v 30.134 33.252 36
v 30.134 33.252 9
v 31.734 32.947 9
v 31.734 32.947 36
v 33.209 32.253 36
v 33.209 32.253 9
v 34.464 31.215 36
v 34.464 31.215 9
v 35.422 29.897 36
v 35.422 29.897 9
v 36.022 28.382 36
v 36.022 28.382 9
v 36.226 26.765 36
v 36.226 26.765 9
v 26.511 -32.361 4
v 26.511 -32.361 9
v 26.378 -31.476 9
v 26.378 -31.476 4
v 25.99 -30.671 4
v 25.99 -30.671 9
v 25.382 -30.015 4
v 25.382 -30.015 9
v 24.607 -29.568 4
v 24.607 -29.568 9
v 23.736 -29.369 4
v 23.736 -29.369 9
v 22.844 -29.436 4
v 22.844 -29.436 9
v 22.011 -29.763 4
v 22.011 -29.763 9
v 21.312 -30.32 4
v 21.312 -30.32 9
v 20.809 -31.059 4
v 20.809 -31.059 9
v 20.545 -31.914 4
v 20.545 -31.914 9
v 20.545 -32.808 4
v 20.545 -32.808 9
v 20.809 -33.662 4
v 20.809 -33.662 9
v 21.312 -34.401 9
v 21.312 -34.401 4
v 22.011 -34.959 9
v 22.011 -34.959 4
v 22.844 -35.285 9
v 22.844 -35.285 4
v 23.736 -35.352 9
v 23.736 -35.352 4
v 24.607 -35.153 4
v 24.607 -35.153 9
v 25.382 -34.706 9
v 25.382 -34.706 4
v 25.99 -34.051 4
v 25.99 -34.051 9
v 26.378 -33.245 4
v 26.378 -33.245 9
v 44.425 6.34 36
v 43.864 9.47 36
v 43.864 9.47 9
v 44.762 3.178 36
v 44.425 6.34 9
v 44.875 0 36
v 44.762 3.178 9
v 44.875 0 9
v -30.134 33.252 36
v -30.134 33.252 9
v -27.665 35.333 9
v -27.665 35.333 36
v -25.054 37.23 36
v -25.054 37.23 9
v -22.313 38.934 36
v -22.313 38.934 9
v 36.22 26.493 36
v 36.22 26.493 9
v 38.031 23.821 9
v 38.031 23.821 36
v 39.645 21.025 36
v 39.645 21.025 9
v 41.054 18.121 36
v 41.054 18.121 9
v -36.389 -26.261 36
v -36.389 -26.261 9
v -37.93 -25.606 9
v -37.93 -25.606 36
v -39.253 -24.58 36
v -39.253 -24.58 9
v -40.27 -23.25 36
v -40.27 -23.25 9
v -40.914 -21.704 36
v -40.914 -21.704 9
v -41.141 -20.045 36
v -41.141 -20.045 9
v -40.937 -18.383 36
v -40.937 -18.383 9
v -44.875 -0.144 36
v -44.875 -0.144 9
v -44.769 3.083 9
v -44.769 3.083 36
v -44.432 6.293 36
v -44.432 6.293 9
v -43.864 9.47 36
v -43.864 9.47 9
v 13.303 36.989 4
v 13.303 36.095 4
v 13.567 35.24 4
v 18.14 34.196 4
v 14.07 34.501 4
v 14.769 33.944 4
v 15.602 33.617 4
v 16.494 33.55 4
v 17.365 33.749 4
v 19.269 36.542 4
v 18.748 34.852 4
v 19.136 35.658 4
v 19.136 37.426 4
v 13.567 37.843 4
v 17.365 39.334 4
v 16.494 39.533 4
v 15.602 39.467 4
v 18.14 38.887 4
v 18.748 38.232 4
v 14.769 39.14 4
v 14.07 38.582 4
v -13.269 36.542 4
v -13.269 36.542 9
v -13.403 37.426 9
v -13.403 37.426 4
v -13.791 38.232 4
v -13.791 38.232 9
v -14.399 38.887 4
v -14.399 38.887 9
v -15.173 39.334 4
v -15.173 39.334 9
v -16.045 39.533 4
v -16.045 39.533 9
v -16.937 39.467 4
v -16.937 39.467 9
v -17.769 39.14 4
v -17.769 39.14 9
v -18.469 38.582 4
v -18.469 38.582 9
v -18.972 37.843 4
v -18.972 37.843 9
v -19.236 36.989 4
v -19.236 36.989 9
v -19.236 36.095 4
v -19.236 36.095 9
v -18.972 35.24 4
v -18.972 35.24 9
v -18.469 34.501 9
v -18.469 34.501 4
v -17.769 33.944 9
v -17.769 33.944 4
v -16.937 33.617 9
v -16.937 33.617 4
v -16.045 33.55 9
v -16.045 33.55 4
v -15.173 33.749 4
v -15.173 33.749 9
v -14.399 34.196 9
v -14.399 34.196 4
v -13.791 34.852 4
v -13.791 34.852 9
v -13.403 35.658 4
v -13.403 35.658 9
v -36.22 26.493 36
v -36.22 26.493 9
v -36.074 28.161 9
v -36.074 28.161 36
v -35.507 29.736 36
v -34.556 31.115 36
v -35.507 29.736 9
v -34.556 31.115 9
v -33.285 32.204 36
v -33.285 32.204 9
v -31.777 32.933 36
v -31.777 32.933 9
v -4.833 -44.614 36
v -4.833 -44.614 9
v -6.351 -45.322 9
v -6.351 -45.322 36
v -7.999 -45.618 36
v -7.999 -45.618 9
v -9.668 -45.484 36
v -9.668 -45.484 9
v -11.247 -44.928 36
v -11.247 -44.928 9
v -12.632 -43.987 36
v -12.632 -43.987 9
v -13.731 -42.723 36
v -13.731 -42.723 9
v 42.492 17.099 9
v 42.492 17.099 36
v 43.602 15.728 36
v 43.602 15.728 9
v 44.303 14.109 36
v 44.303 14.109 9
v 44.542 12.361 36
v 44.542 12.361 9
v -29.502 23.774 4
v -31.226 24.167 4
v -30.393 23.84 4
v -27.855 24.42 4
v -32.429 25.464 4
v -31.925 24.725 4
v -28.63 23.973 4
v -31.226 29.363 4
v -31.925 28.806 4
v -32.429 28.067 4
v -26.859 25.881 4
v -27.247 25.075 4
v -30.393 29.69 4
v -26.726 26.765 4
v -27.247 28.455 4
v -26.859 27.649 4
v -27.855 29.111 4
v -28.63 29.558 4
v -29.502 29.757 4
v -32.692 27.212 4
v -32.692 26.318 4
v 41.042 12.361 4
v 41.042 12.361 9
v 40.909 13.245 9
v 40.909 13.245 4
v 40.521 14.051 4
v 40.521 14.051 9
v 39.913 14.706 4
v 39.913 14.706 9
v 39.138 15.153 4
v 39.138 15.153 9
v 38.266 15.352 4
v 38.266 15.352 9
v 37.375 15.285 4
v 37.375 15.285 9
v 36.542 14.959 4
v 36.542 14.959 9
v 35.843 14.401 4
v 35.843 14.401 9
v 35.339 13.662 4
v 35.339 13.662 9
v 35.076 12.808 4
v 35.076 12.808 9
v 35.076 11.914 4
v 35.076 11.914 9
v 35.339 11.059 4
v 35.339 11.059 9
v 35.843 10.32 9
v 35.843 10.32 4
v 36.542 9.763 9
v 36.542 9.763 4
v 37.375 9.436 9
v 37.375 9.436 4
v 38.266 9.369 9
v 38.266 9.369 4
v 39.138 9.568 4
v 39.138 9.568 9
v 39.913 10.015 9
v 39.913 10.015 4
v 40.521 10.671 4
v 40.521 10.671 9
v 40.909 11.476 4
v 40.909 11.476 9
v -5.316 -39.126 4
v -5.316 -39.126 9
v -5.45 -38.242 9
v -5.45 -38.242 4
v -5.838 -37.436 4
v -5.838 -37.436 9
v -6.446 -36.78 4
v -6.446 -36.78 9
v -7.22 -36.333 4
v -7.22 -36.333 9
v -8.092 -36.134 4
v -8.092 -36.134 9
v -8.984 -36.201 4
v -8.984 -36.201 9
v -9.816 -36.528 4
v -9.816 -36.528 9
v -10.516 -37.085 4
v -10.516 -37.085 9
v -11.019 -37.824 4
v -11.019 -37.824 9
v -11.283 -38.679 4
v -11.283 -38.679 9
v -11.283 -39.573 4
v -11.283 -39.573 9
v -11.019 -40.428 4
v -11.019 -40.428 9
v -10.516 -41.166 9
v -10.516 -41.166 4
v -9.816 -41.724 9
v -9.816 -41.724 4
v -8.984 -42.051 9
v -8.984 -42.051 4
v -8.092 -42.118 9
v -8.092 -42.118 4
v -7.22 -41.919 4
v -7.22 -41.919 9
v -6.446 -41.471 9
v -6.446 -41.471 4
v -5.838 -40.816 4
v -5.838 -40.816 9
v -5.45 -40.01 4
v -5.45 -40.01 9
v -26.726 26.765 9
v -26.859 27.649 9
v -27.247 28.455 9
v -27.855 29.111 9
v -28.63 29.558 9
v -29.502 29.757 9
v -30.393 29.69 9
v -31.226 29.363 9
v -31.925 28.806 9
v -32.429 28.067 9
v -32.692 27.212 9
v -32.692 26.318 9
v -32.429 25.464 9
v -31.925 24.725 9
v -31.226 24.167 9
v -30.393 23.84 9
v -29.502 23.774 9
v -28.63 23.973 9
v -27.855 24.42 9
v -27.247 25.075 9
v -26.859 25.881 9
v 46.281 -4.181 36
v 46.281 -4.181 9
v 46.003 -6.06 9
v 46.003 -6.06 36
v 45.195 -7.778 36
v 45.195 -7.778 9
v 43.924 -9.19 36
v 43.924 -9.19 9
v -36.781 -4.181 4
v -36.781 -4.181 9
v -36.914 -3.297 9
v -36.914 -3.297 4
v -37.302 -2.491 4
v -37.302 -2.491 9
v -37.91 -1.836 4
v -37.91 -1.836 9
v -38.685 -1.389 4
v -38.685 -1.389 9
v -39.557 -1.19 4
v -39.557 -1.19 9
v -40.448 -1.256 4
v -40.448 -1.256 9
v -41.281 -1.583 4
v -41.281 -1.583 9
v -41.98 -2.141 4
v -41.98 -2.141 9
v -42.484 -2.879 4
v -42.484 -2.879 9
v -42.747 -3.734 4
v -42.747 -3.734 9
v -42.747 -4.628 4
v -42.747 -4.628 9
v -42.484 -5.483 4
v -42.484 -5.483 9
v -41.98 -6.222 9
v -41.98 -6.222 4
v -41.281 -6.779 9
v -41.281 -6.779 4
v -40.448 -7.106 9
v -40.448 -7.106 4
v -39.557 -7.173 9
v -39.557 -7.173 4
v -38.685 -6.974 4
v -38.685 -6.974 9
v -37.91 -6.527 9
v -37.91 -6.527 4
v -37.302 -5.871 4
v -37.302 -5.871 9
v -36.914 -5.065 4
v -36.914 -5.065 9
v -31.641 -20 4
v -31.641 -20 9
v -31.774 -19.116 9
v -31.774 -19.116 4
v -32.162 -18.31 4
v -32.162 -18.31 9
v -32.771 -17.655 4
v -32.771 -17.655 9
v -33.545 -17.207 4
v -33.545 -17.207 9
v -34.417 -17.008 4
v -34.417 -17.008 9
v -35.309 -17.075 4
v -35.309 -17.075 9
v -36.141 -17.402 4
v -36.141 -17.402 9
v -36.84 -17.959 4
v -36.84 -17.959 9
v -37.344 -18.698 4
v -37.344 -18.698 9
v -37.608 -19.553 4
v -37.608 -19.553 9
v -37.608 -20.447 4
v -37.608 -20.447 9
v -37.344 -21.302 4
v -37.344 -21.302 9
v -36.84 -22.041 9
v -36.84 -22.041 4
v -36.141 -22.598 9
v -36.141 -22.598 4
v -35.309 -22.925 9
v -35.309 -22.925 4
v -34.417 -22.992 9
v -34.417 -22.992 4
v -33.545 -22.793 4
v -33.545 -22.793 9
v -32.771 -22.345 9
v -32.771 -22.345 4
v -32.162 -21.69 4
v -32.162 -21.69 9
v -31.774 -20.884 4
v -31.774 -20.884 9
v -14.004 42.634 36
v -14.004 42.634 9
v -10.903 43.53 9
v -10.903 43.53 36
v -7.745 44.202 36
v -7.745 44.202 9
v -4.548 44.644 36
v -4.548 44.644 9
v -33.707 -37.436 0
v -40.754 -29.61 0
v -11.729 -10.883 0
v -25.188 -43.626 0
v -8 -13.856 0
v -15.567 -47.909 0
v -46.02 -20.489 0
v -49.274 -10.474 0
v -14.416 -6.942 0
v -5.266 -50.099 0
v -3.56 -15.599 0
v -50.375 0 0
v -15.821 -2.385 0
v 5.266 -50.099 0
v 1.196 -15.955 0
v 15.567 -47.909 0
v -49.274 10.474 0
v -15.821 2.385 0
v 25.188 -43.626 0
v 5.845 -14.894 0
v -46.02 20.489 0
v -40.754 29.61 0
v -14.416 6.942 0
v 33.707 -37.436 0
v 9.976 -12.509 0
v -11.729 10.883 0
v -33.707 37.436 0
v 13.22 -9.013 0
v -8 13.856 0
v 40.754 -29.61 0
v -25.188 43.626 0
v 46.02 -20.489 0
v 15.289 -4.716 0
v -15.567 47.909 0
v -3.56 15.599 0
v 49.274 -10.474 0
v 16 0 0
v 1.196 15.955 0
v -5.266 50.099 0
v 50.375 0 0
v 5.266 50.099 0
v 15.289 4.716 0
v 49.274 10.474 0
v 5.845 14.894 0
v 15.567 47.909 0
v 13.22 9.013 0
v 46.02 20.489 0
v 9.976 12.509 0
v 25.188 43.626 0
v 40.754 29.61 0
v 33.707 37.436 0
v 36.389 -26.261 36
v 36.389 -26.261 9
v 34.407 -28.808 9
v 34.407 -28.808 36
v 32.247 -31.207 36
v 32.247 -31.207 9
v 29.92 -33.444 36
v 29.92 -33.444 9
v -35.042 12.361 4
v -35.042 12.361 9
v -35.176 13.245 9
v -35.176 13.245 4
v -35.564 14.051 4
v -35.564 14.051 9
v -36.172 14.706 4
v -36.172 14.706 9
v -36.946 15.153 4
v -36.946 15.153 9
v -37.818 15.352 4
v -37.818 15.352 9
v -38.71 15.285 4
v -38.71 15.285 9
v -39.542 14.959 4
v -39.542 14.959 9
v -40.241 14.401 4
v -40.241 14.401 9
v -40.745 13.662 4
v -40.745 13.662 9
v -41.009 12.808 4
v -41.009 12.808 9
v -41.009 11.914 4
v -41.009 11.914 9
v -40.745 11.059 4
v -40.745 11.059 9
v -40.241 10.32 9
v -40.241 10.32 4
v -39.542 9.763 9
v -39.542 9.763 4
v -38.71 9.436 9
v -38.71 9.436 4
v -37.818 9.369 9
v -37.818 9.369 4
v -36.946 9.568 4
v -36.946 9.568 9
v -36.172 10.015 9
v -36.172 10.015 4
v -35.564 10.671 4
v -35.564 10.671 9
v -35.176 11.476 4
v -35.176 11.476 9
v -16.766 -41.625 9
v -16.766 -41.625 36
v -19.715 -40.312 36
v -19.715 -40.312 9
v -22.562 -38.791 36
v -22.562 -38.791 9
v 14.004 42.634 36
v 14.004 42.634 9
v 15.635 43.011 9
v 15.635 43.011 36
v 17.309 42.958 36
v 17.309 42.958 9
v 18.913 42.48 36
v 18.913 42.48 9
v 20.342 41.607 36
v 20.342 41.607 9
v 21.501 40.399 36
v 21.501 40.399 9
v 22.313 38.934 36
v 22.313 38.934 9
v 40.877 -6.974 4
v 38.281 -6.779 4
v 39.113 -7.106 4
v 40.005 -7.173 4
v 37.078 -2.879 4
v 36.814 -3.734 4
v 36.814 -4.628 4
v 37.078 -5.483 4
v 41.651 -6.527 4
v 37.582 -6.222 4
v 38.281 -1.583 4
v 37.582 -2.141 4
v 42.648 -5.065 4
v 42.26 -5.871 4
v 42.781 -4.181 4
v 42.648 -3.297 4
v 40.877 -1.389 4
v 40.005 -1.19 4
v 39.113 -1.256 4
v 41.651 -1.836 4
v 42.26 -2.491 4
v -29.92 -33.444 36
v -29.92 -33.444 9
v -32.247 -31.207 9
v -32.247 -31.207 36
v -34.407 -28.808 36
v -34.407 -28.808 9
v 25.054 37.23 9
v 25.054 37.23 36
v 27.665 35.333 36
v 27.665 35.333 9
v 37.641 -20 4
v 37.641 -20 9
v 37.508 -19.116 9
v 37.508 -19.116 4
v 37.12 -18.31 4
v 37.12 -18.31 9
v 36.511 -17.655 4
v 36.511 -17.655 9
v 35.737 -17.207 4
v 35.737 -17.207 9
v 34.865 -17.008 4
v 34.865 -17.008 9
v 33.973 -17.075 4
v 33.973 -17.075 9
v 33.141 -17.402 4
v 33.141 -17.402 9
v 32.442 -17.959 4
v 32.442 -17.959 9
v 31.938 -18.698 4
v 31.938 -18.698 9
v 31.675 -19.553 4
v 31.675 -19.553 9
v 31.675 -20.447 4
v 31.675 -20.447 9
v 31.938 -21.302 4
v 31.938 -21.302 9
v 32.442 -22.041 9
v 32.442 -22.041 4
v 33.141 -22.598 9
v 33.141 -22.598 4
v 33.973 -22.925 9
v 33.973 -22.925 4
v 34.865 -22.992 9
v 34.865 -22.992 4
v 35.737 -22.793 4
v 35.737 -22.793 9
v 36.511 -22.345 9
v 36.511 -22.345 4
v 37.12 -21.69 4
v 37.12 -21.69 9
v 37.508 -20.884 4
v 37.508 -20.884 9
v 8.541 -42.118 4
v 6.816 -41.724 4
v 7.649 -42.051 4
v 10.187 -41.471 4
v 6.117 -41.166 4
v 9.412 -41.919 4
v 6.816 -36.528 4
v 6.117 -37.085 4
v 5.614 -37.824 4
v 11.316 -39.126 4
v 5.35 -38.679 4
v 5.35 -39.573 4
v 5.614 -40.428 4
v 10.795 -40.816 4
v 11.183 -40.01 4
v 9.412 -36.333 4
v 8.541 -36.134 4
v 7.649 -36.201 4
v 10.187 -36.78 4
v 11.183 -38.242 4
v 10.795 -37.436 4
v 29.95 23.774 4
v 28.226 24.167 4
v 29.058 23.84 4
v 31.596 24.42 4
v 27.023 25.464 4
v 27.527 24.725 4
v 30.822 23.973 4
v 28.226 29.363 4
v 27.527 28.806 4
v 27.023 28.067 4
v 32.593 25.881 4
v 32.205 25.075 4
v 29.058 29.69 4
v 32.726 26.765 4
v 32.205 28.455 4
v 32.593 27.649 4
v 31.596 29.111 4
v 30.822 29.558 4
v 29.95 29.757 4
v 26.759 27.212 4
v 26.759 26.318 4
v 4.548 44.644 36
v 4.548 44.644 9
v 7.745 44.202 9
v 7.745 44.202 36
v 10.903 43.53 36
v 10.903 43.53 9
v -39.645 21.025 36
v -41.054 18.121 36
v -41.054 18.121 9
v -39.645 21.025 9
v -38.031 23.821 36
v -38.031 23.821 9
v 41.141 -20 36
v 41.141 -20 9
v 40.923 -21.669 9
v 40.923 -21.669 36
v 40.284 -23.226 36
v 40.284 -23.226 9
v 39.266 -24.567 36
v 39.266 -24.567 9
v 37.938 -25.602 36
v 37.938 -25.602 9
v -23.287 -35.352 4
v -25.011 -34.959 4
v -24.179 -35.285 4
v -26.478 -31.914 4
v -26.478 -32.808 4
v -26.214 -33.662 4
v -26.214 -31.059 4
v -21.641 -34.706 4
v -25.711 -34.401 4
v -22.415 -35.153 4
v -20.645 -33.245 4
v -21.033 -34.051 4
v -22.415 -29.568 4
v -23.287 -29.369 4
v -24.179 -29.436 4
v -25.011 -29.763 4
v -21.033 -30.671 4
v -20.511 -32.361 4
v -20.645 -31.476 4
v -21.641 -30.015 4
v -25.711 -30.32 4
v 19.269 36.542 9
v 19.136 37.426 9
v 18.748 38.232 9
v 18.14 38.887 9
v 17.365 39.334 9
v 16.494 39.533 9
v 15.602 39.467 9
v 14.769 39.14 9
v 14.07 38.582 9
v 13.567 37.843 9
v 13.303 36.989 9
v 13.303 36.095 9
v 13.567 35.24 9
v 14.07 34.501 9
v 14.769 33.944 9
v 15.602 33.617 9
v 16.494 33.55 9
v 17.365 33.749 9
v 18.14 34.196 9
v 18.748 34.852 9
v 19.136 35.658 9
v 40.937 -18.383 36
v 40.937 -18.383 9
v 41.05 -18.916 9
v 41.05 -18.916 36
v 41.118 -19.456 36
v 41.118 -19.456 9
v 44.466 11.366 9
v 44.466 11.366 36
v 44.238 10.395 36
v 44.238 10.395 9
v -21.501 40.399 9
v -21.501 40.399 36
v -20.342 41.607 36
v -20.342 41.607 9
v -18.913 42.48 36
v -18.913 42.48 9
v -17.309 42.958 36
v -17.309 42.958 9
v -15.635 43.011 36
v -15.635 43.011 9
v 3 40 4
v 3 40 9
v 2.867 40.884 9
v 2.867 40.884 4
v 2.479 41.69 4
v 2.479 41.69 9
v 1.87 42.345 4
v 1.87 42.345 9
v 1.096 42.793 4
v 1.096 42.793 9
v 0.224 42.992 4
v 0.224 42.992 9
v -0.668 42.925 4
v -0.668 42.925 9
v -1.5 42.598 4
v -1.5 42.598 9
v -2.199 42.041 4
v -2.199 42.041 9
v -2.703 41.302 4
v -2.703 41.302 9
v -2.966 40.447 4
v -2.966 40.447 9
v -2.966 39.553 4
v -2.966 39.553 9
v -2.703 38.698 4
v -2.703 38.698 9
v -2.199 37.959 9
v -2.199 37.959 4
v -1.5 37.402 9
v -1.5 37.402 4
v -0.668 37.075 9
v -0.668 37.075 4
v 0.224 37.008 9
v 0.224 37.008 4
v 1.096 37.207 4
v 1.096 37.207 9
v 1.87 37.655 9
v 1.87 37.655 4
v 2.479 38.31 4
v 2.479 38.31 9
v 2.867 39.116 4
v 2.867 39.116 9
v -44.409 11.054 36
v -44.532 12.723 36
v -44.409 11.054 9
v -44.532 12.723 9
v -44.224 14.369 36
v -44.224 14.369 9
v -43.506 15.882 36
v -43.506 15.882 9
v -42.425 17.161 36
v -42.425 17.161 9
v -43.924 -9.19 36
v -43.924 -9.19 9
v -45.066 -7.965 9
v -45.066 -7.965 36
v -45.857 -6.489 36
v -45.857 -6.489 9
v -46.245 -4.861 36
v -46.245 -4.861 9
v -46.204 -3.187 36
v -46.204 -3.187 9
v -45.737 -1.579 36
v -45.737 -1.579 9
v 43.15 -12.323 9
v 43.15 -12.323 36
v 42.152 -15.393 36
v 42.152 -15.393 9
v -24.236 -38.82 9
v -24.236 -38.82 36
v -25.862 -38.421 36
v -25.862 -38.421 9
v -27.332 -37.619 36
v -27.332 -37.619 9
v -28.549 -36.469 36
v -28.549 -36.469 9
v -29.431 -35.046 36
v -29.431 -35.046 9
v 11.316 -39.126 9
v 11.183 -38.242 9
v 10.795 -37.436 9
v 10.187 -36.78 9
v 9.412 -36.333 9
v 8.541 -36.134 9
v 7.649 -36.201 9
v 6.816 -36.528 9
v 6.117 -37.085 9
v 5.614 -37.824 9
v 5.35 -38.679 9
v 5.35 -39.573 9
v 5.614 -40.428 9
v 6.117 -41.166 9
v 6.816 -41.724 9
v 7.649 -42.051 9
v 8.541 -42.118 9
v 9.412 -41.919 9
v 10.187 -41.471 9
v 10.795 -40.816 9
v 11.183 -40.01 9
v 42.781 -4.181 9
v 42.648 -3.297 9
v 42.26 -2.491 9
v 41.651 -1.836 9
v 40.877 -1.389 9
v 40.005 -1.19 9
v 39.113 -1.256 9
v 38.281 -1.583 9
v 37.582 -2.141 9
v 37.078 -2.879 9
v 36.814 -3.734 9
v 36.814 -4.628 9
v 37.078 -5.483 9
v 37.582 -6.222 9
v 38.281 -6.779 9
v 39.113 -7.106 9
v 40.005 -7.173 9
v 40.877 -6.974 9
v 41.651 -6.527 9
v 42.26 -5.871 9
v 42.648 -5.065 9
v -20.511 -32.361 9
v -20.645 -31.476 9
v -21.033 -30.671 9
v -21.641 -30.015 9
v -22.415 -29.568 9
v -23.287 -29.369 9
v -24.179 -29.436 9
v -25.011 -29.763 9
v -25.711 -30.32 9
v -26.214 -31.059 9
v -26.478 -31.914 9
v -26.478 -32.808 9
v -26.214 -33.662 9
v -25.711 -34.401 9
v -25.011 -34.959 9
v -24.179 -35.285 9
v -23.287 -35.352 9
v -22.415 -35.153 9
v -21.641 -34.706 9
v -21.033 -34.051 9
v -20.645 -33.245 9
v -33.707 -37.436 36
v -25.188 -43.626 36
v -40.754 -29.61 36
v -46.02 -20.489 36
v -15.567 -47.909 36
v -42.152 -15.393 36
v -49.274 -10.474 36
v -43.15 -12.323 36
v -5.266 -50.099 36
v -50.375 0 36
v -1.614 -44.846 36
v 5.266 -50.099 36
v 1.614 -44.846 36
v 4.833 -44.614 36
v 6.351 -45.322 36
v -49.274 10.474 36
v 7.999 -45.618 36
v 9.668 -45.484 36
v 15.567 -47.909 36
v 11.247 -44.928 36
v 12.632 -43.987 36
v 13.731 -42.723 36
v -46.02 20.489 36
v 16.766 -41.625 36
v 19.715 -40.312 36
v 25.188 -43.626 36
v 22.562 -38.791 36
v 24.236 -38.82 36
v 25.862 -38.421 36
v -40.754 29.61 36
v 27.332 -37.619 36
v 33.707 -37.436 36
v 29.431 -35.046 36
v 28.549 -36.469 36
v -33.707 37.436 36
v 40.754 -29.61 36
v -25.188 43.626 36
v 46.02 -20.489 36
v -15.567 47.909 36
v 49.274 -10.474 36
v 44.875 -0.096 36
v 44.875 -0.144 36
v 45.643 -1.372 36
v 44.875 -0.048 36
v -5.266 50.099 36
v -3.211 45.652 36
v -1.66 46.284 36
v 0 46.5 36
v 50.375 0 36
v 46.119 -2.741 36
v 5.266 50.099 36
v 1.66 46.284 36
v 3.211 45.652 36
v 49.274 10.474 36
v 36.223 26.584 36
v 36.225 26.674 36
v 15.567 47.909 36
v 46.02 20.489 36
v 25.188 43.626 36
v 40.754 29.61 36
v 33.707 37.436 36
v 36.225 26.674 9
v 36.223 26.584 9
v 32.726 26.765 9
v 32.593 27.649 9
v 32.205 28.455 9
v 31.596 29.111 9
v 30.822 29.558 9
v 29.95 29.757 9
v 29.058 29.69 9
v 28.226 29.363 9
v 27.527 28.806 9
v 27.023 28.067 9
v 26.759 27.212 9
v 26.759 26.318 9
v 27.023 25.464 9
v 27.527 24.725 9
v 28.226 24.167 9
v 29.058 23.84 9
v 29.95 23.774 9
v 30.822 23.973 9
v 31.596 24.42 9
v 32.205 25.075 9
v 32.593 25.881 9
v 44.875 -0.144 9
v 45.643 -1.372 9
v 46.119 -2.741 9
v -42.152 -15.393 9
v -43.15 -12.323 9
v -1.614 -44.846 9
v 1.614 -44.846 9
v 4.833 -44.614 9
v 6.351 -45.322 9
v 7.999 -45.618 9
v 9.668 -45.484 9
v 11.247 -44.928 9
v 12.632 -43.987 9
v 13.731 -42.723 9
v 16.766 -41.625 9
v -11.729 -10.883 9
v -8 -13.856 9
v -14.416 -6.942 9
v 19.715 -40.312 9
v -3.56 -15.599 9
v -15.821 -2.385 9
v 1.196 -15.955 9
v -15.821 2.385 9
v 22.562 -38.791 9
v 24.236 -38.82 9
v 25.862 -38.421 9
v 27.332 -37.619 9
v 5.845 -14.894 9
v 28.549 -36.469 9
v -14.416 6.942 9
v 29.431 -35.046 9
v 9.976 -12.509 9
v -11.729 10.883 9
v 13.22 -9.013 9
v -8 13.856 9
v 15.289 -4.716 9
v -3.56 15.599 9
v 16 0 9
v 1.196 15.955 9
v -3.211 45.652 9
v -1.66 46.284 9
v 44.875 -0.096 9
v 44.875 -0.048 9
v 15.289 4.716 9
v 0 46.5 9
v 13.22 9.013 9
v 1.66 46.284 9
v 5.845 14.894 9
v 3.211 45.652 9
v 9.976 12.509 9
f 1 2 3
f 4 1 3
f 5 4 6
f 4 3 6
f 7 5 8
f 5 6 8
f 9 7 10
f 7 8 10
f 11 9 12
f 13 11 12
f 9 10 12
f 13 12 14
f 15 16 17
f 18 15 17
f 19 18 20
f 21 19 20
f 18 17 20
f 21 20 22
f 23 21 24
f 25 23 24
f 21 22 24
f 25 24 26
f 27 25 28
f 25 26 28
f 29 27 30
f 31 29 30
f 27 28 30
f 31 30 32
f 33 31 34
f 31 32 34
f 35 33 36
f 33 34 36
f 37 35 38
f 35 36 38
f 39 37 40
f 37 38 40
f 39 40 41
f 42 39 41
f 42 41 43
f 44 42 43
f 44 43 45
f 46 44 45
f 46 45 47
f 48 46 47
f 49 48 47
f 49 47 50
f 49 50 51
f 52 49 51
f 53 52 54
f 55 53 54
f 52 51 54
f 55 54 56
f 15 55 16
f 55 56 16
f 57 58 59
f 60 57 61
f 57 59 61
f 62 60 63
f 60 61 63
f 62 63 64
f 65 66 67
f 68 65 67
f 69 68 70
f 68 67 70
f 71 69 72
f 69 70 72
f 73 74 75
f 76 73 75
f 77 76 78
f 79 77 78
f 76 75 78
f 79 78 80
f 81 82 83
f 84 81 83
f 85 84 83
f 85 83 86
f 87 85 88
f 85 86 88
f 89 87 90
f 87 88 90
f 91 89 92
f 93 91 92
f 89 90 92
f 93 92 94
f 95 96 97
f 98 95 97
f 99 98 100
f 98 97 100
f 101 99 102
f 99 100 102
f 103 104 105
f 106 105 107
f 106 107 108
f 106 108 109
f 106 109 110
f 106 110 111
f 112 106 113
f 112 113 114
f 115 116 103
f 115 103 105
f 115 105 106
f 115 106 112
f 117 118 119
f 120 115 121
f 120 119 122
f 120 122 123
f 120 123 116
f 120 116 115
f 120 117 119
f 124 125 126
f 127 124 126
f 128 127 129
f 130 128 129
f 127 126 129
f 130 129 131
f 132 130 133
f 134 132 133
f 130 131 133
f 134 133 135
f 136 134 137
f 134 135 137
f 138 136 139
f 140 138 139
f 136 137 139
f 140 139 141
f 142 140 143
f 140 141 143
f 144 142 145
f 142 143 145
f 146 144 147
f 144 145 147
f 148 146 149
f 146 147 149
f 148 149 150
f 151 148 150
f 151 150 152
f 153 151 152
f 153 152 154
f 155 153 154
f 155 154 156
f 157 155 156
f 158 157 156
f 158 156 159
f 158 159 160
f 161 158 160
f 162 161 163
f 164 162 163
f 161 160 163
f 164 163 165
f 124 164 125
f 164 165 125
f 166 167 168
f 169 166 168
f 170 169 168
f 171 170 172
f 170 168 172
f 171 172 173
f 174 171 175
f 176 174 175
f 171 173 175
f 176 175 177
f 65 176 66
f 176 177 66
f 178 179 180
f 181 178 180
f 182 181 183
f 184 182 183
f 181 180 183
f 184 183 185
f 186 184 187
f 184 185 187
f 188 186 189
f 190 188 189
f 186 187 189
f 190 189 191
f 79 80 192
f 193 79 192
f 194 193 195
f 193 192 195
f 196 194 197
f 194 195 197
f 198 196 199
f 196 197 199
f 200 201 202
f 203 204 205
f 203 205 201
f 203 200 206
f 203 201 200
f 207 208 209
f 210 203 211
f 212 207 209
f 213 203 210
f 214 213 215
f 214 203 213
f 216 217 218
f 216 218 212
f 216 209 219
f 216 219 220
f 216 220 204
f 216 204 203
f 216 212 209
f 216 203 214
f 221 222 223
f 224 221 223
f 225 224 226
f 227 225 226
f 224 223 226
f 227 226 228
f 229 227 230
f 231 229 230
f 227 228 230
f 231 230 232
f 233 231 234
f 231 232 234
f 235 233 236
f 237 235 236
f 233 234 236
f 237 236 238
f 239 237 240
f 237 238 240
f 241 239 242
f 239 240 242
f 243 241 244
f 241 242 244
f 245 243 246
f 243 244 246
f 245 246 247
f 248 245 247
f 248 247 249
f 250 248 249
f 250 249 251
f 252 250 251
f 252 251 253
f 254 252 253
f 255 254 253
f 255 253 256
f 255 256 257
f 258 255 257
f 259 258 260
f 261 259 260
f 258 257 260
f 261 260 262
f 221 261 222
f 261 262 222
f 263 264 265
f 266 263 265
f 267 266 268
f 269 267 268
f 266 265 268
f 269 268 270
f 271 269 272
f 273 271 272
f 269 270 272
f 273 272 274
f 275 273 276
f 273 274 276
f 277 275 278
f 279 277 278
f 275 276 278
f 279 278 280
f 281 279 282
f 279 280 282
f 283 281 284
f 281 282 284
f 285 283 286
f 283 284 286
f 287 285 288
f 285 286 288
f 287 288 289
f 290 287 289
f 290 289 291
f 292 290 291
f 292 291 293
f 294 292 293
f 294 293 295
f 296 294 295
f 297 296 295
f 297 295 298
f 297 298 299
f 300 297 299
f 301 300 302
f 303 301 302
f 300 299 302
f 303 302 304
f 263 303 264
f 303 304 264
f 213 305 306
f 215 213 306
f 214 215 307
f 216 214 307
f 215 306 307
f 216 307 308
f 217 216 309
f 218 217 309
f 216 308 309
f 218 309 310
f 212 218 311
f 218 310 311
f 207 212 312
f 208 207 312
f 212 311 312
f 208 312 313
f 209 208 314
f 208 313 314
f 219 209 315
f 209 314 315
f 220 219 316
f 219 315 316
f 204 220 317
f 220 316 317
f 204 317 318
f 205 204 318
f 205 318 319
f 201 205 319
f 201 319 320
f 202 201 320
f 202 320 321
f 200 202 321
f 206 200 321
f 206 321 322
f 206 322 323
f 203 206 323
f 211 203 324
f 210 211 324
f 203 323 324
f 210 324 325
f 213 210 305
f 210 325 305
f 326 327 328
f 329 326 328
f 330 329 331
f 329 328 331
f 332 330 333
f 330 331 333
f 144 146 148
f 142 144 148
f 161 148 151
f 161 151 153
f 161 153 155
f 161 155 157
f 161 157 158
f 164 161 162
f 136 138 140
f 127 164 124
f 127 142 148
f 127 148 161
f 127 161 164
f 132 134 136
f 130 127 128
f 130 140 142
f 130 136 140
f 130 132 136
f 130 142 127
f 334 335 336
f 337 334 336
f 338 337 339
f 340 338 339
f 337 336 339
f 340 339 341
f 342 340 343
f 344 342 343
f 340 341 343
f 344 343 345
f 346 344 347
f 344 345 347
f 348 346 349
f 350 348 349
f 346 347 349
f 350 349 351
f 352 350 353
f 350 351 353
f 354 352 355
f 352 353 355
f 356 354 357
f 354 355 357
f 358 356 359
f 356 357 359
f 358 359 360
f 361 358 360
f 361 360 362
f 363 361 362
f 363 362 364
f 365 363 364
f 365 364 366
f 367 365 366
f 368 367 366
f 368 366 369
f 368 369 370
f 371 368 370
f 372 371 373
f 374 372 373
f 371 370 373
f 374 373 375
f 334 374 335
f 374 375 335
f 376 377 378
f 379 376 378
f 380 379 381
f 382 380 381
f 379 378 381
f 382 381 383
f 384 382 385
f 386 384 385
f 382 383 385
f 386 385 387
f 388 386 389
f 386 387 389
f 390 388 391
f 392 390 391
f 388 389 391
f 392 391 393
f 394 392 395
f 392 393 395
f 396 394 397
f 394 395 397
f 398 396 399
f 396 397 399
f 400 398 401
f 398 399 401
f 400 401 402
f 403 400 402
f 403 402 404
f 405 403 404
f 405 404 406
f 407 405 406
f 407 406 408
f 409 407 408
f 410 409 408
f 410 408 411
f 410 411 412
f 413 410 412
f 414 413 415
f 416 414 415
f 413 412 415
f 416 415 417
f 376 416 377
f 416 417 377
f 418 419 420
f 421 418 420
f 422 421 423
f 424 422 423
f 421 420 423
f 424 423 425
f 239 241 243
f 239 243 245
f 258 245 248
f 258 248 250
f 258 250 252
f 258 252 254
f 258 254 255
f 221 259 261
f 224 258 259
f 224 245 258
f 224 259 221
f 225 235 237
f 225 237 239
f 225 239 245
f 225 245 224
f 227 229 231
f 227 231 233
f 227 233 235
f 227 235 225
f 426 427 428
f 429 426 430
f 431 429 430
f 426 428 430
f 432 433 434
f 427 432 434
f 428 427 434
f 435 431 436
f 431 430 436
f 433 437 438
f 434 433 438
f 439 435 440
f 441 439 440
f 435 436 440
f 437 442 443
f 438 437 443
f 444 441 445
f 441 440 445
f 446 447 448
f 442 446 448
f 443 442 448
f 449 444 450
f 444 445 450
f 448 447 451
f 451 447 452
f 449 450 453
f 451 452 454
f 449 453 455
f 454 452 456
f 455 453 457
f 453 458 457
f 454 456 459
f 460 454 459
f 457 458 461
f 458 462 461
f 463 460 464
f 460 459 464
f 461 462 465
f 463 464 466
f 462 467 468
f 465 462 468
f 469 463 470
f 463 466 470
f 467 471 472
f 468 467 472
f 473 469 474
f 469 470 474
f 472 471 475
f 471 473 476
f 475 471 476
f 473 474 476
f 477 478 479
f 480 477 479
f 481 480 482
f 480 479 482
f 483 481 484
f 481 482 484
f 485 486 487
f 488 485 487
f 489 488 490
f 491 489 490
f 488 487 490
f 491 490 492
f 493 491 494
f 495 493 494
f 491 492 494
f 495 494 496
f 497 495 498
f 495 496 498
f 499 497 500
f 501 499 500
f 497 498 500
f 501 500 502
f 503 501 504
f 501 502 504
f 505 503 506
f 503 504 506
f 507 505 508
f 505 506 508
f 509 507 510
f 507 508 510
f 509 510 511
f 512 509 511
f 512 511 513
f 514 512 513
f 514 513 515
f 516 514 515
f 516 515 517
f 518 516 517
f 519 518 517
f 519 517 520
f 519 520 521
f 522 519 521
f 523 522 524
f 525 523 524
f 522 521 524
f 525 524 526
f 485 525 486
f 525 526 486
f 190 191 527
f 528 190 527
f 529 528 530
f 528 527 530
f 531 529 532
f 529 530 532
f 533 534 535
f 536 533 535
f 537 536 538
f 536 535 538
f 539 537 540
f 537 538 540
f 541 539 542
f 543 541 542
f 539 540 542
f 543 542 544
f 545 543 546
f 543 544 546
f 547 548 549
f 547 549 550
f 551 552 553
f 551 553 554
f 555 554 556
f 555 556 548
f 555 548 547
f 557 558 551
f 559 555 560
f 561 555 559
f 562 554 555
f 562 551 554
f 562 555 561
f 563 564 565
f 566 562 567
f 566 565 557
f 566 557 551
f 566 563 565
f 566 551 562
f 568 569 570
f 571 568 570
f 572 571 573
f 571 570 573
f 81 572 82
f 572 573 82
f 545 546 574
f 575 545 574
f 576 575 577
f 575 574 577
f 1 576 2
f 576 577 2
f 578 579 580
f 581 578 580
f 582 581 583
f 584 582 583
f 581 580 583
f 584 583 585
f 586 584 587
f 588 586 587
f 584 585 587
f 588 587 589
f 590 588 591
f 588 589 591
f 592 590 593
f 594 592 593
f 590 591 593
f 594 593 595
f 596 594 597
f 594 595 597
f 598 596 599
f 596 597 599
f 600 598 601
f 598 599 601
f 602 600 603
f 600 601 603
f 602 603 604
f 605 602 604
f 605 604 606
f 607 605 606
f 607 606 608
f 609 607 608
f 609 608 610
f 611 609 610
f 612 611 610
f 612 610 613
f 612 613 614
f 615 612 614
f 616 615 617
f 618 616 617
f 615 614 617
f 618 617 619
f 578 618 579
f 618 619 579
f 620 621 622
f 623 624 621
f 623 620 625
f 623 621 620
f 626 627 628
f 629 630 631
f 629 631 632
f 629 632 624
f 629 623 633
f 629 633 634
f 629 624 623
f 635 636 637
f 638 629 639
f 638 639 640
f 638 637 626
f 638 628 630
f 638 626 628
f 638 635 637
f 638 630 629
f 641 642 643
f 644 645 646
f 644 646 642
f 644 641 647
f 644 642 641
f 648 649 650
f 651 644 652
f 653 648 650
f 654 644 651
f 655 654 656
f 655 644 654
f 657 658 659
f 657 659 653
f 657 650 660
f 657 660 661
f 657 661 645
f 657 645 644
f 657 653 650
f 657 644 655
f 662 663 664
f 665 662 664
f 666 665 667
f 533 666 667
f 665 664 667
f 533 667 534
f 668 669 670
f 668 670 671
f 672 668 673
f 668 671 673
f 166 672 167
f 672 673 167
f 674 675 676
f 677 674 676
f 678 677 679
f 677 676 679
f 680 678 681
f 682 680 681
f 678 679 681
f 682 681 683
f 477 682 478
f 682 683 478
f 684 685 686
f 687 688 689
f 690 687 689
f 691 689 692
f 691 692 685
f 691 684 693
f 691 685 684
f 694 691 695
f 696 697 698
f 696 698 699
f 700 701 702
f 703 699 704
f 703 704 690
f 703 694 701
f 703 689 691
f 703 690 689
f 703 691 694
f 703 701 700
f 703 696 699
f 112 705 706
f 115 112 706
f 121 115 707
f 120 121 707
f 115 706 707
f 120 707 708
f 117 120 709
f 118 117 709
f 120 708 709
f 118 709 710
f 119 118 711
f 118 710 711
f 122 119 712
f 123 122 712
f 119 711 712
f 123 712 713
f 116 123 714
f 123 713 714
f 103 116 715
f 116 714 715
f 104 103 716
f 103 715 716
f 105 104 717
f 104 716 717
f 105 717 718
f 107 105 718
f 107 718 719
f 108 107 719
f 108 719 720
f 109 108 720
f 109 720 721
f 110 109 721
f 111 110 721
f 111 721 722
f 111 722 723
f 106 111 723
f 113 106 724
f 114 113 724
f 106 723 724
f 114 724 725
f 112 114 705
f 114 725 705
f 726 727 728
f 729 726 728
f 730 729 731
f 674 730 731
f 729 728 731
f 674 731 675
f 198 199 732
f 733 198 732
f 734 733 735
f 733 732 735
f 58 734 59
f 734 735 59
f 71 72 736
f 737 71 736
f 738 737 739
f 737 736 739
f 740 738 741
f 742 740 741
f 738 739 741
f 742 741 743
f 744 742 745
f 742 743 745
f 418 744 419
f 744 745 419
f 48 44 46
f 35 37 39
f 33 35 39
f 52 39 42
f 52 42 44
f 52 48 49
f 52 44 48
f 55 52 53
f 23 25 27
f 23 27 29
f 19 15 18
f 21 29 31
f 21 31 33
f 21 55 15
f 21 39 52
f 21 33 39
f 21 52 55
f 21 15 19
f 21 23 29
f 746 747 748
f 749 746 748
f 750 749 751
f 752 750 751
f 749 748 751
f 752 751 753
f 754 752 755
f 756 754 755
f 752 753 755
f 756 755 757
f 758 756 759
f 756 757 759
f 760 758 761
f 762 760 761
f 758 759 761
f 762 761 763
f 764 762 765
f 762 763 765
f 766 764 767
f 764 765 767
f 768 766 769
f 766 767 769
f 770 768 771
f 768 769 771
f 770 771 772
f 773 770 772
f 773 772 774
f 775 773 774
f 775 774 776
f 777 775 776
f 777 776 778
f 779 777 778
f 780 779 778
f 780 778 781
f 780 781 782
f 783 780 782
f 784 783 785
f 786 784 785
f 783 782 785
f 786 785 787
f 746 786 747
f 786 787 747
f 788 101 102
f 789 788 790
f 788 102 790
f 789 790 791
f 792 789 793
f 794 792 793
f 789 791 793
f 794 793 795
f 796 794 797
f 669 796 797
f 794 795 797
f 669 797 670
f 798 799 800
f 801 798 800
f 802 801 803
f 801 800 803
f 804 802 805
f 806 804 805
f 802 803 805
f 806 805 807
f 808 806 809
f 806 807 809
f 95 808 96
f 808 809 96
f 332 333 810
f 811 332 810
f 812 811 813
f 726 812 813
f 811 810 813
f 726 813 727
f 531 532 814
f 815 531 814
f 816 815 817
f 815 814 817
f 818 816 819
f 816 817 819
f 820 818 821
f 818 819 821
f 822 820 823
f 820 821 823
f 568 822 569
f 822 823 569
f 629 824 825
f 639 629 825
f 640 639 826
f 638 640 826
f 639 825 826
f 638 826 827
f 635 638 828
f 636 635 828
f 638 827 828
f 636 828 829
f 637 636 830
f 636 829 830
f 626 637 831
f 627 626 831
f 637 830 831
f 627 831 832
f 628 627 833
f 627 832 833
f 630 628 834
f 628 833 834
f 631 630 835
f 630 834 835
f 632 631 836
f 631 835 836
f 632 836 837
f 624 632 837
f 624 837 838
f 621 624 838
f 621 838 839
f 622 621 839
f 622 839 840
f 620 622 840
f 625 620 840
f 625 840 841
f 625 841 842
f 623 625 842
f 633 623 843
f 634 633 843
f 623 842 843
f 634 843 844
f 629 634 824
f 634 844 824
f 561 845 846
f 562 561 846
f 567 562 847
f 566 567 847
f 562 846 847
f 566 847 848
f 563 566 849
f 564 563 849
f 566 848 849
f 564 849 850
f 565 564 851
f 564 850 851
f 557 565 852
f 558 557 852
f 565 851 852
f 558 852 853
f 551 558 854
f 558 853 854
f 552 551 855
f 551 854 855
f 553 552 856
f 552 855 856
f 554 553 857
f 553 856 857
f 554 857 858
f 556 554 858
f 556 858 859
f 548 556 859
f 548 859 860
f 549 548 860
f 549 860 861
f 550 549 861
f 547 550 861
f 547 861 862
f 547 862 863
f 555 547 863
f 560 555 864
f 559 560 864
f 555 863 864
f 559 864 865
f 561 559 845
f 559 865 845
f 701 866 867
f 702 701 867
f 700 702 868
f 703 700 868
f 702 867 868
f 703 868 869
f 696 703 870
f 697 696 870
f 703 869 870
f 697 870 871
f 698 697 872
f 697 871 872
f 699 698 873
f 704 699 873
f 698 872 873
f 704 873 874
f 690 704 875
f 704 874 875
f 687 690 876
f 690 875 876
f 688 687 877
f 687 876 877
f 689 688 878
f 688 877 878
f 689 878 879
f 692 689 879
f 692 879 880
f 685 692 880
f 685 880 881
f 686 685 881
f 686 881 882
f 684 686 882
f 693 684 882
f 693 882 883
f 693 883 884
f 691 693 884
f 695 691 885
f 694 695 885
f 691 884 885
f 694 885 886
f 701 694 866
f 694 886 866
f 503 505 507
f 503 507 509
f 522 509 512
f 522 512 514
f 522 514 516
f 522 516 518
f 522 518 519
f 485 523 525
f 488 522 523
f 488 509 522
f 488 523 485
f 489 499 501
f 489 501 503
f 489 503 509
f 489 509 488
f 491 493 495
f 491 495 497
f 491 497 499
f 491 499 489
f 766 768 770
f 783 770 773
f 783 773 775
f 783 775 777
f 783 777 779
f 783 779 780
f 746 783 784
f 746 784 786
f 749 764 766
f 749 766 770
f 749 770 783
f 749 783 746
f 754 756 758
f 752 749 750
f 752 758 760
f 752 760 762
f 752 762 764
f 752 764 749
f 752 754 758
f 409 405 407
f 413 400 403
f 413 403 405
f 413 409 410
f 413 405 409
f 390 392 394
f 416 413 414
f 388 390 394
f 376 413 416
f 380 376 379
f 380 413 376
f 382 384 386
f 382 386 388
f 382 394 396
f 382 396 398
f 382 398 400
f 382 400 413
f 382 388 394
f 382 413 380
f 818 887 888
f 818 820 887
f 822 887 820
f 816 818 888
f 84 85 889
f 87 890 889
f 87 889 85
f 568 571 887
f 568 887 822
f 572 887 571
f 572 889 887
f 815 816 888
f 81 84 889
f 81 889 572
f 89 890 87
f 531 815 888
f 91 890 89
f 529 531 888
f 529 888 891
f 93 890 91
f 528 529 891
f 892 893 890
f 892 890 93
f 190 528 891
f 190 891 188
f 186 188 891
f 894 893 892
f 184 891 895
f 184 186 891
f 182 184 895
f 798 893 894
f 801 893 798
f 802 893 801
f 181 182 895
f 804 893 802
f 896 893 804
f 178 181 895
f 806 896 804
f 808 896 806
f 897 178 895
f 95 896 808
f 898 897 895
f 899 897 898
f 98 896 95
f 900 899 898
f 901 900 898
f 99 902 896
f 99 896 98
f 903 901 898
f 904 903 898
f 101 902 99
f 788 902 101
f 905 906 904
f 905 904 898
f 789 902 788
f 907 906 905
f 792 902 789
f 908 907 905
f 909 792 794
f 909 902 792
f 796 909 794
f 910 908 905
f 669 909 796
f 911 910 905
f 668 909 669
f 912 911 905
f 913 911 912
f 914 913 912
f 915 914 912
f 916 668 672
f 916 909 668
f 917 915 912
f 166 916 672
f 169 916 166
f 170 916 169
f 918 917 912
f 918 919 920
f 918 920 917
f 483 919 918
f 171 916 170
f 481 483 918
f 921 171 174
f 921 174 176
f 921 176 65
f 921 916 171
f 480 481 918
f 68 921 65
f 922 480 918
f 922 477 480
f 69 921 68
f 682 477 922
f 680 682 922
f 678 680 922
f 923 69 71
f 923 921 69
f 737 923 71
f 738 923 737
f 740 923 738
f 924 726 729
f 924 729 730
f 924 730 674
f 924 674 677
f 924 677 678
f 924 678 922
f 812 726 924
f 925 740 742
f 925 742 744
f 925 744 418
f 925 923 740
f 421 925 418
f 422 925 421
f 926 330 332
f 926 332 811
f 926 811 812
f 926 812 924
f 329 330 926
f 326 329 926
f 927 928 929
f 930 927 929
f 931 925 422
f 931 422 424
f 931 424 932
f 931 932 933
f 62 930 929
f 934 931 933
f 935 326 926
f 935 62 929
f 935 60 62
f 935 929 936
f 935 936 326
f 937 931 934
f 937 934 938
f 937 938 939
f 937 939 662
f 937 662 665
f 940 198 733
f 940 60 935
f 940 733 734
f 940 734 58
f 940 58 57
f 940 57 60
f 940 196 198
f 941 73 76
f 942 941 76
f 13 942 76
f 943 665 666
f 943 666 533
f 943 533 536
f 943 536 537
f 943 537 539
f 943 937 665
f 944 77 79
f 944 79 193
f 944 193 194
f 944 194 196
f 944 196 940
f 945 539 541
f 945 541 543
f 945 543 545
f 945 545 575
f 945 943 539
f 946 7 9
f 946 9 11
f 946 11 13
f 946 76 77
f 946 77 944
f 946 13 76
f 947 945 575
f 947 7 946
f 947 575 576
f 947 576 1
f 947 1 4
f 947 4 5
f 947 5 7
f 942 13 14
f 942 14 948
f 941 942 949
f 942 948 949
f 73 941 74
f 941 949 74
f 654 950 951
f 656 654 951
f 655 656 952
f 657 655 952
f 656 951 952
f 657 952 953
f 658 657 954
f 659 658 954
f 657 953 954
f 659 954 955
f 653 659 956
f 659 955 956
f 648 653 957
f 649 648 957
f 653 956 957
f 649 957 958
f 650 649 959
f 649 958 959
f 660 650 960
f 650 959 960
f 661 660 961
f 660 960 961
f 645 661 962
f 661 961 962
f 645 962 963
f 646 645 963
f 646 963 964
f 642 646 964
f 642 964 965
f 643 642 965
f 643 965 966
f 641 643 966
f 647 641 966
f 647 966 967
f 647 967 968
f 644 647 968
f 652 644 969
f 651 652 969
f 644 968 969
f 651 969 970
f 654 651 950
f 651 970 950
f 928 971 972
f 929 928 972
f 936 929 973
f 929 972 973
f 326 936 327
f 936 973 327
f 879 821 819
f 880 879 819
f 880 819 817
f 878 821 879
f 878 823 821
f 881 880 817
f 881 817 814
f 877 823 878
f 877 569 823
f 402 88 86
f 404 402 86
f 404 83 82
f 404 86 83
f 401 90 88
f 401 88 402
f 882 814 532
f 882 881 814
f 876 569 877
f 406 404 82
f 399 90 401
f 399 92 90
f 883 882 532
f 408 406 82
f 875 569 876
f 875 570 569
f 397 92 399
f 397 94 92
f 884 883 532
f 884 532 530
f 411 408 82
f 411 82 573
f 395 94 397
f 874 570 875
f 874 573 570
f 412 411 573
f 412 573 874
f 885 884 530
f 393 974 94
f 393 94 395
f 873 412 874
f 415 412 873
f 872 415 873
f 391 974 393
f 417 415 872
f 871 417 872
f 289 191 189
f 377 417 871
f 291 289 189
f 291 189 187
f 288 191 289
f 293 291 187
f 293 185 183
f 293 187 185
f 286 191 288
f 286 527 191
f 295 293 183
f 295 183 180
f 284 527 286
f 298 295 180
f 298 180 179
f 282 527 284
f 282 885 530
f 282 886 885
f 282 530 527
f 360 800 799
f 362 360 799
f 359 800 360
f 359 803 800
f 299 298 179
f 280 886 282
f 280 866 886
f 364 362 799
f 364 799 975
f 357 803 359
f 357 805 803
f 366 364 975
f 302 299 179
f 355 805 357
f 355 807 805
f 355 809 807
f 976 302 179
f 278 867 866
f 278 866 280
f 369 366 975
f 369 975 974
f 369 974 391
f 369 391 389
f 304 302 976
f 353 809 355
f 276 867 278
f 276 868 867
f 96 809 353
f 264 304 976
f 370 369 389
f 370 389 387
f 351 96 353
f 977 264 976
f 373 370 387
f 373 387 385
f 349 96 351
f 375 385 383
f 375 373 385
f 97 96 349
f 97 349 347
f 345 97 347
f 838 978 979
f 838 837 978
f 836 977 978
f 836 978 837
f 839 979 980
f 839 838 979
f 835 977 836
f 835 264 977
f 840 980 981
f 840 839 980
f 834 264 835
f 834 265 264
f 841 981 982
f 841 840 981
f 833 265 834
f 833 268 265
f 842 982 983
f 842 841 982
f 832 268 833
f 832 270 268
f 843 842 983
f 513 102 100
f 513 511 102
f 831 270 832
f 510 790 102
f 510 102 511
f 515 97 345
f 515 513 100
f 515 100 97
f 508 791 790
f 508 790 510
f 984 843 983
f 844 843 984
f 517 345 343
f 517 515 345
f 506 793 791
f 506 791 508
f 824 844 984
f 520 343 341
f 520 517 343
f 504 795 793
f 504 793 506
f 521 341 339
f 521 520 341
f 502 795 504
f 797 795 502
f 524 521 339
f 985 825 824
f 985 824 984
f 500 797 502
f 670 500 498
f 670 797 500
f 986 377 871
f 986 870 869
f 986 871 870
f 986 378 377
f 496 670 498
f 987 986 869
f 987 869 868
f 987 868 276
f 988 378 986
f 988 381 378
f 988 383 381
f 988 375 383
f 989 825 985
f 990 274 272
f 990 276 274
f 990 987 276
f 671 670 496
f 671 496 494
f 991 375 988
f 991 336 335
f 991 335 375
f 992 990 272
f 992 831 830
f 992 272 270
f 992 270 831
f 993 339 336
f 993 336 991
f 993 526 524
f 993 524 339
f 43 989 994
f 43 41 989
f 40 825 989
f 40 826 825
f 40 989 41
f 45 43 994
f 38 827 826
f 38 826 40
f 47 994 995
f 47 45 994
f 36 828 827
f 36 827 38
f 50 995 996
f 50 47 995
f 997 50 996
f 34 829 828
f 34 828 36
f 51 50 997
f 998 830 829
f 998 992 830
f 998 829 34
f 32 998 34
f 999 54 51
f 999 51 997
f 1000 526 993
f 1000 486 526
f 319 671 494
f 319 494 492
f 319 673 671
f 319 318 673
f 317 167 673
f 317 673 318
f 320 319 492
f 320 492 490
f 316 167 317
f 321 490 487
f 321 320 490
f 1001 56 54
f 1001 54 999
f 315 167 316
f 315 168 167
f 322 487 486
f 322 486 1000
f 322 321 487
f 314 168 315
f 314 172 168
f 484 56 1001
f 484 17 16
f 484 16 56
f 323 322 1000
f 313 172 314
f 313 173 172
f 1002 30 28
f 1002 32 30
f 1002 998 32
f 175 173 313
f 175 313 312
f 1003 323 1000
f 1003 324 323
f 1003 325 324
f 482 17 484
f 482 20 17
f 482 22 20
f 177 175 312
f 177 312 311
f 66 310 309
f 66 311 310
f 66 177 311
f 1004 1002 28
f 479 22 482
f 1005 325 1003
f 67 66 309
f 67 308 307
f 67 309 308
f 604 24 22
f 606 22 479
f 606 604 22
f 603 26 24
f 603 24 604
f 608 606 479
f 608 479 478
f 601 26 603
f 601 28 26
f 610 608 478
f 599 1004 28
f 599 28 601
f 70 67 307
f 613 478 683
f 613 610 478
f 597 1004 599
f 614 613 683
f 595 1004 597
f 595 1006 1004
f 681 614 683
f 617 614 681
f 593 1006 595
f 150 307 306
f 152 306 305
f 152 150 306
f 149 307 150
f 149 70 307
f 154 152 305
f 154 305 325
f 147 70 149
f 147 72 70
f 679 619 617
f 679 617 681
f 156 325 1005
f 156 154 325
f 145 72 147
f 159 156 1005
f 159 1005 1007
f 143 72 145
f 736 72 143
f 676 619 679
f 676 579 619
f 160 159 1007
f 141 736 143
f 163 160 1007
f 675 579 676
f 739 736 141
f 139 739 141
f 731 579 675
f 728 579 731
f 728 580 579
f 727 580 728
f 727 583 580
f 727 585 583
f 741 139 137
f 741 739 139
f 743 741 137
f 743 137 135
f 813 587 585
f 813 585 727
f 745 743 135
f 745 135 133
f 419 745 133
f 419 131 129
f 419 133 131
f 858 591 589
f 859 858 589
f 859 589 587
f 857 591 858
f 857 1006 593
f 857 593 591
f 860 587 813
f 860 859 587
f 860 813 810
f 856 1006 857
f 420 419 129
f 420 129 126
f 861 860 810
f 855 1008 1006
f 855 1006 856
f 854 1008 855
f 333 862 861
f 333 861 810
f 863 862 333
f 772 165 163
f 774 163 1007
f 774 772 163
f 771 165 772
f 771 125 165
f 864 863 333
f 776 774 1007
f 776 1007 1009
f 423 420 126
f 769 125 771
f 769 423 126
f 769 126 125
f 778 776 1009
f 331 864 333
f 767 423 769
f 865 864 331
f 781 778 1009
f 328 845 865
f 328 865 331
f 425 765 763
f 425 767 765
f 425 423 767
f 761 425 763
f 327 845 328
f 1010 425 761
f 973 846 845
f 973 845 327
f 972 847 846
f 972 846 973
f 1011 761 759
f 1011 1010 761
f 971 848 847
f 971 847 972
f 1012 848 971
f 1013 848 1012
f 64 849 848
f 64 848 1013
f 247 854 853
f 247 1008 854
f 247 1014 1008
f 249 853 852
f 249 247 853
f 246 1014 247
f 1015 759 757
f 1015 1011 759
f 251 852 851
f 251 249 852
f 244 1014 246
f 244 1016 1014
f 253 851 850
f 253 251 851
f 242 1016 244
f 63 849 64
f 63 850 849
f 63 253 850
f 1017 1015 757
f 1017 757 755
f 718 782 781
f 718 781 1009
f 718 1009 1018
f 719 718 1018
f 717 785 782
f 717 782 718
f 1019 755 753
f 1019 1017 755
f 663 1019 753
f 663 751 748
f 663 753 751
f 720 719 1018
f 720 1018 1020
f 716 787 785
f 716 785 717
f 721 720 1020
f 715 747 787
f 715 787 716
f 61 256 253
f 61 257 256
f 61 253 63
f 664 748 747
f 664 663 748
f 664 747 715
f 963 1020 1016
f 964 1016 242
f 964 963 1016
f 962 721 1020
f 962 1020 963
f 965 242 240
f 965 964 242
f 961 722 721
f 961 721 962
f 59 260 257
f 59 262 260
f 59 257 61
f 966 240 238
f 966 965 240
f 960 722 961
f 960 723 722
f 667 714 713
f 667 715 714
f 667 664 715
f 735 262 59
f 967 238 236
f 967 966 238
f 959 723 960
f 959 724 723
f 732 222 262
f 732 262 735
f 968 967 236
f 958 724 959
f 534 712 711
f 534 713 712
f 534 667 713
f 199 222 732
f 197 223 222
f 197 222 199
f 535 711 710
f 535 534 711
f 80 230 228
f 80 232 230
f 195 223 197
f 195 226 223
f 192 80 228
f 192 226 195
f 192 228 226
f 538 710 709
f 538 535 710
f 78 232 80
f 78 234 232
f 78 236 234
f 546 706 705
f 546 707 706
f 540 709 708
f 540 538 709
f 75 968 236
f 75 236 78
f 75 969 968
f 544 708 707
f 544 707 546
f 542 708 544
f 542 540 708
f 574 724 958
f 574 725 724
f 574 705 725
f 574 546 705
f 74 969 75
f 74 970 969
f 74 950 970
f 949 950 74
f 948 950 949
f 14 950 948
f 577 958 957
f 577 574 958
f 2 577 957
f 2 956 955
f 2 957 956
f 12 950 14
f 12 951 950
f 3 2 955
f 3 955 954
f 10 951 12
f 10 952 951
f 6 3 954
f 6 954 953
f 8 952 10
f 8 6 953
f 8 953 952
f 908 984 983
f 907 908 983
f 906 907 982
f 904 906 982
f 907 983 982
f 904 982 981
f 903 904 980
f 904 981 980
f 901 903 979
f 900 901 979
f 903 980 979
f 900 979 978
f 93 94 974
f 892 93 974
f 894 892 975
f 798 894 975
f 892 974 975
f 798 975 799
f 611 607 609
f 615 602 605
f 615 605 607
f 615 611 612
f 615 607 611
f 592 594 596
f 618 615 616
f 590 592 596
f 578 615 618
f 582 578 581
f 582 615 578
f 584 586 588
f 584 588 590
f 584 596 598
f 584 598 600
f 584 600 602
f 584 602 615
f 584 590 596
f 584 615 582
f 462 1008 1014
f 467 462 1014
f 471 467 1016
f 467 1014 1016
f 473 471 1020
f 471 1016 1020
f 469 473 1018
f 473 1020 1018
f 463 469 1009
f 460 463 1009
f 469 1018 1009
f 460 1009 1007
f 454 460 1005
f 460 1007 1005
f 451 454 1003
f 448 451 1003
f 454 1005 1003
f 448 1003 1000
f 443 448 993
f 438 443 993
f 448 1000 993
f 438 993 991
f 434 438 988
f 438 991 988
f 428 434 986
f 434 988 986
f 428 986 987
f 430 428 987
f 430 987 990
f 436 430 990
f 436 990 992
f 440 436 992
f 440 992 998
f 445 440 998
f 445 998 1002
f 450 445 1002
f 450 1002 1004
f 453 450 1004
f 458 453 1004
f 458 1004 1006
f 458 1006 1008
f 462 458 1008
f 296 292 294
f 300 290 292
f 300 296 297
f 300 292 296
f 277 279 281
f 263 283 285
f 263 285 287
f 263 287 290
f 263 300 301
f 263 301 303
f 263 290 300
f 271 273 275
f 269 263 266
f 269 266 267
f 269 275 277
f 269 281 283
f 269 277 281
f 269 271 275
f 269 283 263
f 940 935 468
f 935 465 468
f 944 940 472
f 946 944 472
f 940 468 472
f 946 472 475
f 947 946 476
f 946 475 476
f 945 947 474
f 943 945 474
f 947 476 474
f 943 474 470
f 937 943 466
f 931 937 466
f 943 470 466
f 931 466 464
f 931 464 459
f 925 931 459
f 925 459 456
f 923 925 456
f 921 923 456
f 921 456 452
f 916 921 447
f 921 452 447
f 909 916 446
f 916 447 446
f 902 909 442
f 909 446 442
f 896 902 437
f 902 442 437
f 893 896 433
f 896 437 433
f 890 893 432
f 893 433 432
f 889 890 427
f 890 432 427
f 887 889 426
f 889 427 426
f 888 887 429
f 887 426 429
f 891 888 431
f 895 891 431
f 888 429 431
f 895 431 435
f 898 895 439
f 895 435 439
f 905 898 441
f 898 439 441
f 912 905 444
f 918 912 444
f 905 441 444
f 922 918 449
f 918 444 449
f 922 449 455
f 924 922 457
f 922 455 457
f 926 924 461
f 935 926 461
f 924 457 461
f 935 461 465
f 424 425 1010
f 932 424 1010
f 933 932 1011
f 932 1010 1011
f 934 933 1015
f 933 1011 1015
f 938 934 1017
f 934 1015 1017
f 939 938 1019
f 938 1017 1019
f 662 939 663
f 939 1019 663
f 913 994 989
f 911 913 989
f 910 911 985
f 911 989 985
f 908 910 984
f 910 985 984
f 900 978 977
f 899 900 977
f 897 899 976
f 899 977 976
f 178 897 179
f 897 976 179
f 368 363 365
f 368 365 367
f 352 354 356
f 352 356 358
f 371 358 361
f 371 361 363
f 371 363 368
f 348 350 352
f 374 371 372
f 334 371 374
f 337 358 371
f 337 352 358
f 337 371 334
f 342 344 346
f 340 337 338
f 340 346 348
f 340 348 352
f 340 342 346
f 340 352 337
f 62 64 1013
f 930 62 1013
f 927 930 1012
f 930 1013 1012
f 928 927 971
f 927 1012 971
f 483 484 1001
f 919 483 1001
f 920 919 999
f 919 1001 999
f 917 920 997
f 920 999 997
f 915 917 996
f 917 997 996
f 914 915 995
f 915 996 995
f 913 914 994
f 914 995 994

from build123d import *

# Parameters (mm, degrees)
SKETCH1_R           = 50.375
BOSS_EXTRUDE1_DEPTH = 9
SKETCH2_R           = 50.375
BOSS_EXTRUDE2_DEPTH = 27
SKETCH3_R           = 3
CUT_EXTRUDE3_DEPTH  = 5
SKETCH4_R           = 16
CUT_EXTRUDE4_DEPTH  = 77.185833657


with BuildPart() as part:
    # Sketch1 → Boss-Extrude1 (new body)
    with BuildSketch(Plane.XY):
        Circle(SKETCH1_R)
    extrude(amount=BOSS_EXTRUDE1_DEPTH)

    # Sketch2 → Boss-Extrude2 (add)
    with BuildSketch(Plane.XY.offset(9)):
        Circle(SKETCH2_R)
        with BuildLine():
            ThreePointArc((43.864306317, 9.470388393), (44.621611193, 4.762083526), (44.875, 0))
            ThreePointArc((44.875, 0), (44.874942611, -0.071767888), (44.874770445, -0.143535592))
            ThreePointArc((44.874770445, -0.143535592), (45.919292349, -2.043419548), (46.280875815, -4.181138531))
            ThreePointArc((46.280875815, -4.181138531), (45.662212981, -6.948786113), (43.923991772, -9.189590403))
            ThreePointArc((43.923991772, -9.189590403), (42.678661169, -13.867137623), (40.936761518, -18.383339778))
            ThreePointArc((40.936761518, -18.383339778), (41.089750325, -19.185243866), (41.141016151, -20))
            ThreePointArc((41.141016151, -20), (39.818405701, -23.929966596), (36.388820013, -26.260605535))
            ThreePointArc((36.388820013, -26.260605535), (33.348624043, -30.02723596), (29.920414626, -33.444497509))
            ThreePointArc((29.920414626, -33.444497509), (27.332014232, -37.619290238), (22.561690692, -38.790923399))
            ThreePointArc((22.561690692, -38.790923399), (18.252306858, -40.995352412), (13.730556226, -42.722797787))
            ThreePointArc((13.730556226, -42.722797787), (9.667893623, -45.483863434), (4.833440083, -44.613938203))
            ThreePointArc((4.833440083, -44.613938203), (0, -44.875), (-4.833440083, -44.613938203))
            ThreePointArc((-4.833440083, -44.613938203), (-9.667893623, -45.483863434), (-13.730556226, -42.722797787))
            ThreePointArc((-13.730556226, -42.722797787), (-18.252306858, -40.995352412), (-22.561690692, -38.790923399))
            ThreePointArc((-22.561690692, -38.790923399), (-27.332014232, -37.619290238), (-29.920414626, -33.444497509))
            ThreePointArc((-29.920414626, -33.444497509), (-33.348624043, -30.02723596), (-36.388820013, -26.260605535))
            ThreePointArc((-36.388820013, -26.260605535), (-40.270181276, -23.25), (-40.936761518, -18.383339778))
            ThreePointArc((-40.936761518, -18.383339778), (-42.678661169, -13.867137623), (-43.923991772, -9.189590403))
            ThreePointArc((-43.923991772, -9.189590403), (-46.245268135, -4.860573542), (-44.874770445, -0.143535592))
            ThreePointArc((-44.874770445, -0.143535592), (-44.629170055, 4.690714789), (-43.864306317, 9.470388393))
            ThreePointArc((-43.864306317, 9.470388393), (-44.224128008, 14.369290238), (-41.053523888, 18.121087202))
            ThreePointArc((-41.053523888, 18.121087202), (-38.862889995, 22.4375), (-36.220083805, 26.492851001))
            ThreePointArc((-36.220083805, 26.492851001), (-34.556234385, 31.114573196), (-30.133750091, 33.252409393))
            ThreePointArc((-30.133750091, 33.252409393), (-26.376863197, 36.304637623), (-22.313079754, 38.934458991))
            ThreePointArc((-22.313079754, 38.934458991), (-18.913253903, 42.47986378), (-14.003577146, 42.634087912))
            ThreePointArc((-14.003577146, 42.634087912), (-9.330037125, 43.894373583), (-4.547941505, 44.643945313))
            ThreePointArc((-4.547941505, 44.643945313), (0, 46.5), (4.547941505, 44.643945313))
            ThreePointArc((4.547941505, 44.643945313), (9.330037125, 43.894373583), (14.003577146, 42.634087912))
            ThreePointArc((14.003577146, 42.634087912), (18.913253903, 42.47986378), (22.313079754, 38.934458991))
            ThreePointArc((22.313079754, 38.934458991), (26.376863197, 36.304637623), (30.133750091, 33.252409393))
            ThreePointArc((30.133750091, 33.252409393), (34.464026918, 31.214846656), (36.225793019, 26.765224254))
            ThreePointArc((36.225793019, 26.765224254), (36.224365559, 26.629007713), (36.220083805, 26.492851001))
            ThreePointArc((36.220083805, 26.492851001), (38.862889995, 22.4375), (41.053523888, 18.121087202))
            ThreePointArc((41.053523888, 18.121087202), (43.602081289, 15.72793303), (44.542260652, 12.360679775))
            ThreePointArc((44.542260652, 12.360679775), (44.370502778, 10.876310688), (43.864306317, 9.470388393))
        make_face(mode=Mode.SUBTRACT)
    extrude(amount=BOSS_EXTRUDE2_DEPTH)

    # Sketch3 → Cut-Extrude3 (cut)
    with BuildSketch(Plane.XY.offset(9)):
        with Locations((0, 40)):
            Circle(SKETCH3_R)
        with Locations((16.269465723, 36.541818306)):
            Circle(SKETCH3_R)
        with Locations((29.725793019, 26.765224254)):
            Circle(SKETCH3_R)
        with Locations((38.042260652, 12.360679775)):
            Circle(SKETCH3_R)
        with Locations((39.780875815, -4.181138531)):
            Circle(SKETCH3_R)
        with Locations((34.641016151, -20)):
            Circle(SKETCH3_R)
        with Locations((23.511410092, -32.360679775)):
            Circle(SKETCH3_R)
        with Locations((8.316467633, -39.125904029)):
            Circle(SKETCH3_R)
        with Locations((-8.316467633, -39.125904029)):
            Circle(SKETCH3_R)
        with Locations((-23.511410092, -32.360679775)):
            Circle(SKETCH3_R)
        with Locations((-34.641016151, -20)):
            Circle(SKETCH3_R)
        with Locations((-39.780875815, -4.181138531)):
            Circle(SKETCH3_R)
        with Locations((-38.042260652, 12.360679775)):
            Circle(SKETCH3_R)
        with Locations((-29.725793019, 26.765224254)):
            Circle(SKETCH3_R)
        with Locations((-16.269465723, 36.541818306)):
            Circle(SKETCH3_R)
    extrude(amount=-CUT_EXTRUDE3_DEPTH, mode=Mode.SUBTRACT)

    # Sketch4 → Cut-Extrude4 (cut, through all)
    with BuildSketch(Plane.XY.offset(9)):
        Circle(SKETCH4_R)
    extrude(amount=-CUT_EXTRUDE4_DEPTH, mode=Mode.SUBTRACT)


solid = part.part
